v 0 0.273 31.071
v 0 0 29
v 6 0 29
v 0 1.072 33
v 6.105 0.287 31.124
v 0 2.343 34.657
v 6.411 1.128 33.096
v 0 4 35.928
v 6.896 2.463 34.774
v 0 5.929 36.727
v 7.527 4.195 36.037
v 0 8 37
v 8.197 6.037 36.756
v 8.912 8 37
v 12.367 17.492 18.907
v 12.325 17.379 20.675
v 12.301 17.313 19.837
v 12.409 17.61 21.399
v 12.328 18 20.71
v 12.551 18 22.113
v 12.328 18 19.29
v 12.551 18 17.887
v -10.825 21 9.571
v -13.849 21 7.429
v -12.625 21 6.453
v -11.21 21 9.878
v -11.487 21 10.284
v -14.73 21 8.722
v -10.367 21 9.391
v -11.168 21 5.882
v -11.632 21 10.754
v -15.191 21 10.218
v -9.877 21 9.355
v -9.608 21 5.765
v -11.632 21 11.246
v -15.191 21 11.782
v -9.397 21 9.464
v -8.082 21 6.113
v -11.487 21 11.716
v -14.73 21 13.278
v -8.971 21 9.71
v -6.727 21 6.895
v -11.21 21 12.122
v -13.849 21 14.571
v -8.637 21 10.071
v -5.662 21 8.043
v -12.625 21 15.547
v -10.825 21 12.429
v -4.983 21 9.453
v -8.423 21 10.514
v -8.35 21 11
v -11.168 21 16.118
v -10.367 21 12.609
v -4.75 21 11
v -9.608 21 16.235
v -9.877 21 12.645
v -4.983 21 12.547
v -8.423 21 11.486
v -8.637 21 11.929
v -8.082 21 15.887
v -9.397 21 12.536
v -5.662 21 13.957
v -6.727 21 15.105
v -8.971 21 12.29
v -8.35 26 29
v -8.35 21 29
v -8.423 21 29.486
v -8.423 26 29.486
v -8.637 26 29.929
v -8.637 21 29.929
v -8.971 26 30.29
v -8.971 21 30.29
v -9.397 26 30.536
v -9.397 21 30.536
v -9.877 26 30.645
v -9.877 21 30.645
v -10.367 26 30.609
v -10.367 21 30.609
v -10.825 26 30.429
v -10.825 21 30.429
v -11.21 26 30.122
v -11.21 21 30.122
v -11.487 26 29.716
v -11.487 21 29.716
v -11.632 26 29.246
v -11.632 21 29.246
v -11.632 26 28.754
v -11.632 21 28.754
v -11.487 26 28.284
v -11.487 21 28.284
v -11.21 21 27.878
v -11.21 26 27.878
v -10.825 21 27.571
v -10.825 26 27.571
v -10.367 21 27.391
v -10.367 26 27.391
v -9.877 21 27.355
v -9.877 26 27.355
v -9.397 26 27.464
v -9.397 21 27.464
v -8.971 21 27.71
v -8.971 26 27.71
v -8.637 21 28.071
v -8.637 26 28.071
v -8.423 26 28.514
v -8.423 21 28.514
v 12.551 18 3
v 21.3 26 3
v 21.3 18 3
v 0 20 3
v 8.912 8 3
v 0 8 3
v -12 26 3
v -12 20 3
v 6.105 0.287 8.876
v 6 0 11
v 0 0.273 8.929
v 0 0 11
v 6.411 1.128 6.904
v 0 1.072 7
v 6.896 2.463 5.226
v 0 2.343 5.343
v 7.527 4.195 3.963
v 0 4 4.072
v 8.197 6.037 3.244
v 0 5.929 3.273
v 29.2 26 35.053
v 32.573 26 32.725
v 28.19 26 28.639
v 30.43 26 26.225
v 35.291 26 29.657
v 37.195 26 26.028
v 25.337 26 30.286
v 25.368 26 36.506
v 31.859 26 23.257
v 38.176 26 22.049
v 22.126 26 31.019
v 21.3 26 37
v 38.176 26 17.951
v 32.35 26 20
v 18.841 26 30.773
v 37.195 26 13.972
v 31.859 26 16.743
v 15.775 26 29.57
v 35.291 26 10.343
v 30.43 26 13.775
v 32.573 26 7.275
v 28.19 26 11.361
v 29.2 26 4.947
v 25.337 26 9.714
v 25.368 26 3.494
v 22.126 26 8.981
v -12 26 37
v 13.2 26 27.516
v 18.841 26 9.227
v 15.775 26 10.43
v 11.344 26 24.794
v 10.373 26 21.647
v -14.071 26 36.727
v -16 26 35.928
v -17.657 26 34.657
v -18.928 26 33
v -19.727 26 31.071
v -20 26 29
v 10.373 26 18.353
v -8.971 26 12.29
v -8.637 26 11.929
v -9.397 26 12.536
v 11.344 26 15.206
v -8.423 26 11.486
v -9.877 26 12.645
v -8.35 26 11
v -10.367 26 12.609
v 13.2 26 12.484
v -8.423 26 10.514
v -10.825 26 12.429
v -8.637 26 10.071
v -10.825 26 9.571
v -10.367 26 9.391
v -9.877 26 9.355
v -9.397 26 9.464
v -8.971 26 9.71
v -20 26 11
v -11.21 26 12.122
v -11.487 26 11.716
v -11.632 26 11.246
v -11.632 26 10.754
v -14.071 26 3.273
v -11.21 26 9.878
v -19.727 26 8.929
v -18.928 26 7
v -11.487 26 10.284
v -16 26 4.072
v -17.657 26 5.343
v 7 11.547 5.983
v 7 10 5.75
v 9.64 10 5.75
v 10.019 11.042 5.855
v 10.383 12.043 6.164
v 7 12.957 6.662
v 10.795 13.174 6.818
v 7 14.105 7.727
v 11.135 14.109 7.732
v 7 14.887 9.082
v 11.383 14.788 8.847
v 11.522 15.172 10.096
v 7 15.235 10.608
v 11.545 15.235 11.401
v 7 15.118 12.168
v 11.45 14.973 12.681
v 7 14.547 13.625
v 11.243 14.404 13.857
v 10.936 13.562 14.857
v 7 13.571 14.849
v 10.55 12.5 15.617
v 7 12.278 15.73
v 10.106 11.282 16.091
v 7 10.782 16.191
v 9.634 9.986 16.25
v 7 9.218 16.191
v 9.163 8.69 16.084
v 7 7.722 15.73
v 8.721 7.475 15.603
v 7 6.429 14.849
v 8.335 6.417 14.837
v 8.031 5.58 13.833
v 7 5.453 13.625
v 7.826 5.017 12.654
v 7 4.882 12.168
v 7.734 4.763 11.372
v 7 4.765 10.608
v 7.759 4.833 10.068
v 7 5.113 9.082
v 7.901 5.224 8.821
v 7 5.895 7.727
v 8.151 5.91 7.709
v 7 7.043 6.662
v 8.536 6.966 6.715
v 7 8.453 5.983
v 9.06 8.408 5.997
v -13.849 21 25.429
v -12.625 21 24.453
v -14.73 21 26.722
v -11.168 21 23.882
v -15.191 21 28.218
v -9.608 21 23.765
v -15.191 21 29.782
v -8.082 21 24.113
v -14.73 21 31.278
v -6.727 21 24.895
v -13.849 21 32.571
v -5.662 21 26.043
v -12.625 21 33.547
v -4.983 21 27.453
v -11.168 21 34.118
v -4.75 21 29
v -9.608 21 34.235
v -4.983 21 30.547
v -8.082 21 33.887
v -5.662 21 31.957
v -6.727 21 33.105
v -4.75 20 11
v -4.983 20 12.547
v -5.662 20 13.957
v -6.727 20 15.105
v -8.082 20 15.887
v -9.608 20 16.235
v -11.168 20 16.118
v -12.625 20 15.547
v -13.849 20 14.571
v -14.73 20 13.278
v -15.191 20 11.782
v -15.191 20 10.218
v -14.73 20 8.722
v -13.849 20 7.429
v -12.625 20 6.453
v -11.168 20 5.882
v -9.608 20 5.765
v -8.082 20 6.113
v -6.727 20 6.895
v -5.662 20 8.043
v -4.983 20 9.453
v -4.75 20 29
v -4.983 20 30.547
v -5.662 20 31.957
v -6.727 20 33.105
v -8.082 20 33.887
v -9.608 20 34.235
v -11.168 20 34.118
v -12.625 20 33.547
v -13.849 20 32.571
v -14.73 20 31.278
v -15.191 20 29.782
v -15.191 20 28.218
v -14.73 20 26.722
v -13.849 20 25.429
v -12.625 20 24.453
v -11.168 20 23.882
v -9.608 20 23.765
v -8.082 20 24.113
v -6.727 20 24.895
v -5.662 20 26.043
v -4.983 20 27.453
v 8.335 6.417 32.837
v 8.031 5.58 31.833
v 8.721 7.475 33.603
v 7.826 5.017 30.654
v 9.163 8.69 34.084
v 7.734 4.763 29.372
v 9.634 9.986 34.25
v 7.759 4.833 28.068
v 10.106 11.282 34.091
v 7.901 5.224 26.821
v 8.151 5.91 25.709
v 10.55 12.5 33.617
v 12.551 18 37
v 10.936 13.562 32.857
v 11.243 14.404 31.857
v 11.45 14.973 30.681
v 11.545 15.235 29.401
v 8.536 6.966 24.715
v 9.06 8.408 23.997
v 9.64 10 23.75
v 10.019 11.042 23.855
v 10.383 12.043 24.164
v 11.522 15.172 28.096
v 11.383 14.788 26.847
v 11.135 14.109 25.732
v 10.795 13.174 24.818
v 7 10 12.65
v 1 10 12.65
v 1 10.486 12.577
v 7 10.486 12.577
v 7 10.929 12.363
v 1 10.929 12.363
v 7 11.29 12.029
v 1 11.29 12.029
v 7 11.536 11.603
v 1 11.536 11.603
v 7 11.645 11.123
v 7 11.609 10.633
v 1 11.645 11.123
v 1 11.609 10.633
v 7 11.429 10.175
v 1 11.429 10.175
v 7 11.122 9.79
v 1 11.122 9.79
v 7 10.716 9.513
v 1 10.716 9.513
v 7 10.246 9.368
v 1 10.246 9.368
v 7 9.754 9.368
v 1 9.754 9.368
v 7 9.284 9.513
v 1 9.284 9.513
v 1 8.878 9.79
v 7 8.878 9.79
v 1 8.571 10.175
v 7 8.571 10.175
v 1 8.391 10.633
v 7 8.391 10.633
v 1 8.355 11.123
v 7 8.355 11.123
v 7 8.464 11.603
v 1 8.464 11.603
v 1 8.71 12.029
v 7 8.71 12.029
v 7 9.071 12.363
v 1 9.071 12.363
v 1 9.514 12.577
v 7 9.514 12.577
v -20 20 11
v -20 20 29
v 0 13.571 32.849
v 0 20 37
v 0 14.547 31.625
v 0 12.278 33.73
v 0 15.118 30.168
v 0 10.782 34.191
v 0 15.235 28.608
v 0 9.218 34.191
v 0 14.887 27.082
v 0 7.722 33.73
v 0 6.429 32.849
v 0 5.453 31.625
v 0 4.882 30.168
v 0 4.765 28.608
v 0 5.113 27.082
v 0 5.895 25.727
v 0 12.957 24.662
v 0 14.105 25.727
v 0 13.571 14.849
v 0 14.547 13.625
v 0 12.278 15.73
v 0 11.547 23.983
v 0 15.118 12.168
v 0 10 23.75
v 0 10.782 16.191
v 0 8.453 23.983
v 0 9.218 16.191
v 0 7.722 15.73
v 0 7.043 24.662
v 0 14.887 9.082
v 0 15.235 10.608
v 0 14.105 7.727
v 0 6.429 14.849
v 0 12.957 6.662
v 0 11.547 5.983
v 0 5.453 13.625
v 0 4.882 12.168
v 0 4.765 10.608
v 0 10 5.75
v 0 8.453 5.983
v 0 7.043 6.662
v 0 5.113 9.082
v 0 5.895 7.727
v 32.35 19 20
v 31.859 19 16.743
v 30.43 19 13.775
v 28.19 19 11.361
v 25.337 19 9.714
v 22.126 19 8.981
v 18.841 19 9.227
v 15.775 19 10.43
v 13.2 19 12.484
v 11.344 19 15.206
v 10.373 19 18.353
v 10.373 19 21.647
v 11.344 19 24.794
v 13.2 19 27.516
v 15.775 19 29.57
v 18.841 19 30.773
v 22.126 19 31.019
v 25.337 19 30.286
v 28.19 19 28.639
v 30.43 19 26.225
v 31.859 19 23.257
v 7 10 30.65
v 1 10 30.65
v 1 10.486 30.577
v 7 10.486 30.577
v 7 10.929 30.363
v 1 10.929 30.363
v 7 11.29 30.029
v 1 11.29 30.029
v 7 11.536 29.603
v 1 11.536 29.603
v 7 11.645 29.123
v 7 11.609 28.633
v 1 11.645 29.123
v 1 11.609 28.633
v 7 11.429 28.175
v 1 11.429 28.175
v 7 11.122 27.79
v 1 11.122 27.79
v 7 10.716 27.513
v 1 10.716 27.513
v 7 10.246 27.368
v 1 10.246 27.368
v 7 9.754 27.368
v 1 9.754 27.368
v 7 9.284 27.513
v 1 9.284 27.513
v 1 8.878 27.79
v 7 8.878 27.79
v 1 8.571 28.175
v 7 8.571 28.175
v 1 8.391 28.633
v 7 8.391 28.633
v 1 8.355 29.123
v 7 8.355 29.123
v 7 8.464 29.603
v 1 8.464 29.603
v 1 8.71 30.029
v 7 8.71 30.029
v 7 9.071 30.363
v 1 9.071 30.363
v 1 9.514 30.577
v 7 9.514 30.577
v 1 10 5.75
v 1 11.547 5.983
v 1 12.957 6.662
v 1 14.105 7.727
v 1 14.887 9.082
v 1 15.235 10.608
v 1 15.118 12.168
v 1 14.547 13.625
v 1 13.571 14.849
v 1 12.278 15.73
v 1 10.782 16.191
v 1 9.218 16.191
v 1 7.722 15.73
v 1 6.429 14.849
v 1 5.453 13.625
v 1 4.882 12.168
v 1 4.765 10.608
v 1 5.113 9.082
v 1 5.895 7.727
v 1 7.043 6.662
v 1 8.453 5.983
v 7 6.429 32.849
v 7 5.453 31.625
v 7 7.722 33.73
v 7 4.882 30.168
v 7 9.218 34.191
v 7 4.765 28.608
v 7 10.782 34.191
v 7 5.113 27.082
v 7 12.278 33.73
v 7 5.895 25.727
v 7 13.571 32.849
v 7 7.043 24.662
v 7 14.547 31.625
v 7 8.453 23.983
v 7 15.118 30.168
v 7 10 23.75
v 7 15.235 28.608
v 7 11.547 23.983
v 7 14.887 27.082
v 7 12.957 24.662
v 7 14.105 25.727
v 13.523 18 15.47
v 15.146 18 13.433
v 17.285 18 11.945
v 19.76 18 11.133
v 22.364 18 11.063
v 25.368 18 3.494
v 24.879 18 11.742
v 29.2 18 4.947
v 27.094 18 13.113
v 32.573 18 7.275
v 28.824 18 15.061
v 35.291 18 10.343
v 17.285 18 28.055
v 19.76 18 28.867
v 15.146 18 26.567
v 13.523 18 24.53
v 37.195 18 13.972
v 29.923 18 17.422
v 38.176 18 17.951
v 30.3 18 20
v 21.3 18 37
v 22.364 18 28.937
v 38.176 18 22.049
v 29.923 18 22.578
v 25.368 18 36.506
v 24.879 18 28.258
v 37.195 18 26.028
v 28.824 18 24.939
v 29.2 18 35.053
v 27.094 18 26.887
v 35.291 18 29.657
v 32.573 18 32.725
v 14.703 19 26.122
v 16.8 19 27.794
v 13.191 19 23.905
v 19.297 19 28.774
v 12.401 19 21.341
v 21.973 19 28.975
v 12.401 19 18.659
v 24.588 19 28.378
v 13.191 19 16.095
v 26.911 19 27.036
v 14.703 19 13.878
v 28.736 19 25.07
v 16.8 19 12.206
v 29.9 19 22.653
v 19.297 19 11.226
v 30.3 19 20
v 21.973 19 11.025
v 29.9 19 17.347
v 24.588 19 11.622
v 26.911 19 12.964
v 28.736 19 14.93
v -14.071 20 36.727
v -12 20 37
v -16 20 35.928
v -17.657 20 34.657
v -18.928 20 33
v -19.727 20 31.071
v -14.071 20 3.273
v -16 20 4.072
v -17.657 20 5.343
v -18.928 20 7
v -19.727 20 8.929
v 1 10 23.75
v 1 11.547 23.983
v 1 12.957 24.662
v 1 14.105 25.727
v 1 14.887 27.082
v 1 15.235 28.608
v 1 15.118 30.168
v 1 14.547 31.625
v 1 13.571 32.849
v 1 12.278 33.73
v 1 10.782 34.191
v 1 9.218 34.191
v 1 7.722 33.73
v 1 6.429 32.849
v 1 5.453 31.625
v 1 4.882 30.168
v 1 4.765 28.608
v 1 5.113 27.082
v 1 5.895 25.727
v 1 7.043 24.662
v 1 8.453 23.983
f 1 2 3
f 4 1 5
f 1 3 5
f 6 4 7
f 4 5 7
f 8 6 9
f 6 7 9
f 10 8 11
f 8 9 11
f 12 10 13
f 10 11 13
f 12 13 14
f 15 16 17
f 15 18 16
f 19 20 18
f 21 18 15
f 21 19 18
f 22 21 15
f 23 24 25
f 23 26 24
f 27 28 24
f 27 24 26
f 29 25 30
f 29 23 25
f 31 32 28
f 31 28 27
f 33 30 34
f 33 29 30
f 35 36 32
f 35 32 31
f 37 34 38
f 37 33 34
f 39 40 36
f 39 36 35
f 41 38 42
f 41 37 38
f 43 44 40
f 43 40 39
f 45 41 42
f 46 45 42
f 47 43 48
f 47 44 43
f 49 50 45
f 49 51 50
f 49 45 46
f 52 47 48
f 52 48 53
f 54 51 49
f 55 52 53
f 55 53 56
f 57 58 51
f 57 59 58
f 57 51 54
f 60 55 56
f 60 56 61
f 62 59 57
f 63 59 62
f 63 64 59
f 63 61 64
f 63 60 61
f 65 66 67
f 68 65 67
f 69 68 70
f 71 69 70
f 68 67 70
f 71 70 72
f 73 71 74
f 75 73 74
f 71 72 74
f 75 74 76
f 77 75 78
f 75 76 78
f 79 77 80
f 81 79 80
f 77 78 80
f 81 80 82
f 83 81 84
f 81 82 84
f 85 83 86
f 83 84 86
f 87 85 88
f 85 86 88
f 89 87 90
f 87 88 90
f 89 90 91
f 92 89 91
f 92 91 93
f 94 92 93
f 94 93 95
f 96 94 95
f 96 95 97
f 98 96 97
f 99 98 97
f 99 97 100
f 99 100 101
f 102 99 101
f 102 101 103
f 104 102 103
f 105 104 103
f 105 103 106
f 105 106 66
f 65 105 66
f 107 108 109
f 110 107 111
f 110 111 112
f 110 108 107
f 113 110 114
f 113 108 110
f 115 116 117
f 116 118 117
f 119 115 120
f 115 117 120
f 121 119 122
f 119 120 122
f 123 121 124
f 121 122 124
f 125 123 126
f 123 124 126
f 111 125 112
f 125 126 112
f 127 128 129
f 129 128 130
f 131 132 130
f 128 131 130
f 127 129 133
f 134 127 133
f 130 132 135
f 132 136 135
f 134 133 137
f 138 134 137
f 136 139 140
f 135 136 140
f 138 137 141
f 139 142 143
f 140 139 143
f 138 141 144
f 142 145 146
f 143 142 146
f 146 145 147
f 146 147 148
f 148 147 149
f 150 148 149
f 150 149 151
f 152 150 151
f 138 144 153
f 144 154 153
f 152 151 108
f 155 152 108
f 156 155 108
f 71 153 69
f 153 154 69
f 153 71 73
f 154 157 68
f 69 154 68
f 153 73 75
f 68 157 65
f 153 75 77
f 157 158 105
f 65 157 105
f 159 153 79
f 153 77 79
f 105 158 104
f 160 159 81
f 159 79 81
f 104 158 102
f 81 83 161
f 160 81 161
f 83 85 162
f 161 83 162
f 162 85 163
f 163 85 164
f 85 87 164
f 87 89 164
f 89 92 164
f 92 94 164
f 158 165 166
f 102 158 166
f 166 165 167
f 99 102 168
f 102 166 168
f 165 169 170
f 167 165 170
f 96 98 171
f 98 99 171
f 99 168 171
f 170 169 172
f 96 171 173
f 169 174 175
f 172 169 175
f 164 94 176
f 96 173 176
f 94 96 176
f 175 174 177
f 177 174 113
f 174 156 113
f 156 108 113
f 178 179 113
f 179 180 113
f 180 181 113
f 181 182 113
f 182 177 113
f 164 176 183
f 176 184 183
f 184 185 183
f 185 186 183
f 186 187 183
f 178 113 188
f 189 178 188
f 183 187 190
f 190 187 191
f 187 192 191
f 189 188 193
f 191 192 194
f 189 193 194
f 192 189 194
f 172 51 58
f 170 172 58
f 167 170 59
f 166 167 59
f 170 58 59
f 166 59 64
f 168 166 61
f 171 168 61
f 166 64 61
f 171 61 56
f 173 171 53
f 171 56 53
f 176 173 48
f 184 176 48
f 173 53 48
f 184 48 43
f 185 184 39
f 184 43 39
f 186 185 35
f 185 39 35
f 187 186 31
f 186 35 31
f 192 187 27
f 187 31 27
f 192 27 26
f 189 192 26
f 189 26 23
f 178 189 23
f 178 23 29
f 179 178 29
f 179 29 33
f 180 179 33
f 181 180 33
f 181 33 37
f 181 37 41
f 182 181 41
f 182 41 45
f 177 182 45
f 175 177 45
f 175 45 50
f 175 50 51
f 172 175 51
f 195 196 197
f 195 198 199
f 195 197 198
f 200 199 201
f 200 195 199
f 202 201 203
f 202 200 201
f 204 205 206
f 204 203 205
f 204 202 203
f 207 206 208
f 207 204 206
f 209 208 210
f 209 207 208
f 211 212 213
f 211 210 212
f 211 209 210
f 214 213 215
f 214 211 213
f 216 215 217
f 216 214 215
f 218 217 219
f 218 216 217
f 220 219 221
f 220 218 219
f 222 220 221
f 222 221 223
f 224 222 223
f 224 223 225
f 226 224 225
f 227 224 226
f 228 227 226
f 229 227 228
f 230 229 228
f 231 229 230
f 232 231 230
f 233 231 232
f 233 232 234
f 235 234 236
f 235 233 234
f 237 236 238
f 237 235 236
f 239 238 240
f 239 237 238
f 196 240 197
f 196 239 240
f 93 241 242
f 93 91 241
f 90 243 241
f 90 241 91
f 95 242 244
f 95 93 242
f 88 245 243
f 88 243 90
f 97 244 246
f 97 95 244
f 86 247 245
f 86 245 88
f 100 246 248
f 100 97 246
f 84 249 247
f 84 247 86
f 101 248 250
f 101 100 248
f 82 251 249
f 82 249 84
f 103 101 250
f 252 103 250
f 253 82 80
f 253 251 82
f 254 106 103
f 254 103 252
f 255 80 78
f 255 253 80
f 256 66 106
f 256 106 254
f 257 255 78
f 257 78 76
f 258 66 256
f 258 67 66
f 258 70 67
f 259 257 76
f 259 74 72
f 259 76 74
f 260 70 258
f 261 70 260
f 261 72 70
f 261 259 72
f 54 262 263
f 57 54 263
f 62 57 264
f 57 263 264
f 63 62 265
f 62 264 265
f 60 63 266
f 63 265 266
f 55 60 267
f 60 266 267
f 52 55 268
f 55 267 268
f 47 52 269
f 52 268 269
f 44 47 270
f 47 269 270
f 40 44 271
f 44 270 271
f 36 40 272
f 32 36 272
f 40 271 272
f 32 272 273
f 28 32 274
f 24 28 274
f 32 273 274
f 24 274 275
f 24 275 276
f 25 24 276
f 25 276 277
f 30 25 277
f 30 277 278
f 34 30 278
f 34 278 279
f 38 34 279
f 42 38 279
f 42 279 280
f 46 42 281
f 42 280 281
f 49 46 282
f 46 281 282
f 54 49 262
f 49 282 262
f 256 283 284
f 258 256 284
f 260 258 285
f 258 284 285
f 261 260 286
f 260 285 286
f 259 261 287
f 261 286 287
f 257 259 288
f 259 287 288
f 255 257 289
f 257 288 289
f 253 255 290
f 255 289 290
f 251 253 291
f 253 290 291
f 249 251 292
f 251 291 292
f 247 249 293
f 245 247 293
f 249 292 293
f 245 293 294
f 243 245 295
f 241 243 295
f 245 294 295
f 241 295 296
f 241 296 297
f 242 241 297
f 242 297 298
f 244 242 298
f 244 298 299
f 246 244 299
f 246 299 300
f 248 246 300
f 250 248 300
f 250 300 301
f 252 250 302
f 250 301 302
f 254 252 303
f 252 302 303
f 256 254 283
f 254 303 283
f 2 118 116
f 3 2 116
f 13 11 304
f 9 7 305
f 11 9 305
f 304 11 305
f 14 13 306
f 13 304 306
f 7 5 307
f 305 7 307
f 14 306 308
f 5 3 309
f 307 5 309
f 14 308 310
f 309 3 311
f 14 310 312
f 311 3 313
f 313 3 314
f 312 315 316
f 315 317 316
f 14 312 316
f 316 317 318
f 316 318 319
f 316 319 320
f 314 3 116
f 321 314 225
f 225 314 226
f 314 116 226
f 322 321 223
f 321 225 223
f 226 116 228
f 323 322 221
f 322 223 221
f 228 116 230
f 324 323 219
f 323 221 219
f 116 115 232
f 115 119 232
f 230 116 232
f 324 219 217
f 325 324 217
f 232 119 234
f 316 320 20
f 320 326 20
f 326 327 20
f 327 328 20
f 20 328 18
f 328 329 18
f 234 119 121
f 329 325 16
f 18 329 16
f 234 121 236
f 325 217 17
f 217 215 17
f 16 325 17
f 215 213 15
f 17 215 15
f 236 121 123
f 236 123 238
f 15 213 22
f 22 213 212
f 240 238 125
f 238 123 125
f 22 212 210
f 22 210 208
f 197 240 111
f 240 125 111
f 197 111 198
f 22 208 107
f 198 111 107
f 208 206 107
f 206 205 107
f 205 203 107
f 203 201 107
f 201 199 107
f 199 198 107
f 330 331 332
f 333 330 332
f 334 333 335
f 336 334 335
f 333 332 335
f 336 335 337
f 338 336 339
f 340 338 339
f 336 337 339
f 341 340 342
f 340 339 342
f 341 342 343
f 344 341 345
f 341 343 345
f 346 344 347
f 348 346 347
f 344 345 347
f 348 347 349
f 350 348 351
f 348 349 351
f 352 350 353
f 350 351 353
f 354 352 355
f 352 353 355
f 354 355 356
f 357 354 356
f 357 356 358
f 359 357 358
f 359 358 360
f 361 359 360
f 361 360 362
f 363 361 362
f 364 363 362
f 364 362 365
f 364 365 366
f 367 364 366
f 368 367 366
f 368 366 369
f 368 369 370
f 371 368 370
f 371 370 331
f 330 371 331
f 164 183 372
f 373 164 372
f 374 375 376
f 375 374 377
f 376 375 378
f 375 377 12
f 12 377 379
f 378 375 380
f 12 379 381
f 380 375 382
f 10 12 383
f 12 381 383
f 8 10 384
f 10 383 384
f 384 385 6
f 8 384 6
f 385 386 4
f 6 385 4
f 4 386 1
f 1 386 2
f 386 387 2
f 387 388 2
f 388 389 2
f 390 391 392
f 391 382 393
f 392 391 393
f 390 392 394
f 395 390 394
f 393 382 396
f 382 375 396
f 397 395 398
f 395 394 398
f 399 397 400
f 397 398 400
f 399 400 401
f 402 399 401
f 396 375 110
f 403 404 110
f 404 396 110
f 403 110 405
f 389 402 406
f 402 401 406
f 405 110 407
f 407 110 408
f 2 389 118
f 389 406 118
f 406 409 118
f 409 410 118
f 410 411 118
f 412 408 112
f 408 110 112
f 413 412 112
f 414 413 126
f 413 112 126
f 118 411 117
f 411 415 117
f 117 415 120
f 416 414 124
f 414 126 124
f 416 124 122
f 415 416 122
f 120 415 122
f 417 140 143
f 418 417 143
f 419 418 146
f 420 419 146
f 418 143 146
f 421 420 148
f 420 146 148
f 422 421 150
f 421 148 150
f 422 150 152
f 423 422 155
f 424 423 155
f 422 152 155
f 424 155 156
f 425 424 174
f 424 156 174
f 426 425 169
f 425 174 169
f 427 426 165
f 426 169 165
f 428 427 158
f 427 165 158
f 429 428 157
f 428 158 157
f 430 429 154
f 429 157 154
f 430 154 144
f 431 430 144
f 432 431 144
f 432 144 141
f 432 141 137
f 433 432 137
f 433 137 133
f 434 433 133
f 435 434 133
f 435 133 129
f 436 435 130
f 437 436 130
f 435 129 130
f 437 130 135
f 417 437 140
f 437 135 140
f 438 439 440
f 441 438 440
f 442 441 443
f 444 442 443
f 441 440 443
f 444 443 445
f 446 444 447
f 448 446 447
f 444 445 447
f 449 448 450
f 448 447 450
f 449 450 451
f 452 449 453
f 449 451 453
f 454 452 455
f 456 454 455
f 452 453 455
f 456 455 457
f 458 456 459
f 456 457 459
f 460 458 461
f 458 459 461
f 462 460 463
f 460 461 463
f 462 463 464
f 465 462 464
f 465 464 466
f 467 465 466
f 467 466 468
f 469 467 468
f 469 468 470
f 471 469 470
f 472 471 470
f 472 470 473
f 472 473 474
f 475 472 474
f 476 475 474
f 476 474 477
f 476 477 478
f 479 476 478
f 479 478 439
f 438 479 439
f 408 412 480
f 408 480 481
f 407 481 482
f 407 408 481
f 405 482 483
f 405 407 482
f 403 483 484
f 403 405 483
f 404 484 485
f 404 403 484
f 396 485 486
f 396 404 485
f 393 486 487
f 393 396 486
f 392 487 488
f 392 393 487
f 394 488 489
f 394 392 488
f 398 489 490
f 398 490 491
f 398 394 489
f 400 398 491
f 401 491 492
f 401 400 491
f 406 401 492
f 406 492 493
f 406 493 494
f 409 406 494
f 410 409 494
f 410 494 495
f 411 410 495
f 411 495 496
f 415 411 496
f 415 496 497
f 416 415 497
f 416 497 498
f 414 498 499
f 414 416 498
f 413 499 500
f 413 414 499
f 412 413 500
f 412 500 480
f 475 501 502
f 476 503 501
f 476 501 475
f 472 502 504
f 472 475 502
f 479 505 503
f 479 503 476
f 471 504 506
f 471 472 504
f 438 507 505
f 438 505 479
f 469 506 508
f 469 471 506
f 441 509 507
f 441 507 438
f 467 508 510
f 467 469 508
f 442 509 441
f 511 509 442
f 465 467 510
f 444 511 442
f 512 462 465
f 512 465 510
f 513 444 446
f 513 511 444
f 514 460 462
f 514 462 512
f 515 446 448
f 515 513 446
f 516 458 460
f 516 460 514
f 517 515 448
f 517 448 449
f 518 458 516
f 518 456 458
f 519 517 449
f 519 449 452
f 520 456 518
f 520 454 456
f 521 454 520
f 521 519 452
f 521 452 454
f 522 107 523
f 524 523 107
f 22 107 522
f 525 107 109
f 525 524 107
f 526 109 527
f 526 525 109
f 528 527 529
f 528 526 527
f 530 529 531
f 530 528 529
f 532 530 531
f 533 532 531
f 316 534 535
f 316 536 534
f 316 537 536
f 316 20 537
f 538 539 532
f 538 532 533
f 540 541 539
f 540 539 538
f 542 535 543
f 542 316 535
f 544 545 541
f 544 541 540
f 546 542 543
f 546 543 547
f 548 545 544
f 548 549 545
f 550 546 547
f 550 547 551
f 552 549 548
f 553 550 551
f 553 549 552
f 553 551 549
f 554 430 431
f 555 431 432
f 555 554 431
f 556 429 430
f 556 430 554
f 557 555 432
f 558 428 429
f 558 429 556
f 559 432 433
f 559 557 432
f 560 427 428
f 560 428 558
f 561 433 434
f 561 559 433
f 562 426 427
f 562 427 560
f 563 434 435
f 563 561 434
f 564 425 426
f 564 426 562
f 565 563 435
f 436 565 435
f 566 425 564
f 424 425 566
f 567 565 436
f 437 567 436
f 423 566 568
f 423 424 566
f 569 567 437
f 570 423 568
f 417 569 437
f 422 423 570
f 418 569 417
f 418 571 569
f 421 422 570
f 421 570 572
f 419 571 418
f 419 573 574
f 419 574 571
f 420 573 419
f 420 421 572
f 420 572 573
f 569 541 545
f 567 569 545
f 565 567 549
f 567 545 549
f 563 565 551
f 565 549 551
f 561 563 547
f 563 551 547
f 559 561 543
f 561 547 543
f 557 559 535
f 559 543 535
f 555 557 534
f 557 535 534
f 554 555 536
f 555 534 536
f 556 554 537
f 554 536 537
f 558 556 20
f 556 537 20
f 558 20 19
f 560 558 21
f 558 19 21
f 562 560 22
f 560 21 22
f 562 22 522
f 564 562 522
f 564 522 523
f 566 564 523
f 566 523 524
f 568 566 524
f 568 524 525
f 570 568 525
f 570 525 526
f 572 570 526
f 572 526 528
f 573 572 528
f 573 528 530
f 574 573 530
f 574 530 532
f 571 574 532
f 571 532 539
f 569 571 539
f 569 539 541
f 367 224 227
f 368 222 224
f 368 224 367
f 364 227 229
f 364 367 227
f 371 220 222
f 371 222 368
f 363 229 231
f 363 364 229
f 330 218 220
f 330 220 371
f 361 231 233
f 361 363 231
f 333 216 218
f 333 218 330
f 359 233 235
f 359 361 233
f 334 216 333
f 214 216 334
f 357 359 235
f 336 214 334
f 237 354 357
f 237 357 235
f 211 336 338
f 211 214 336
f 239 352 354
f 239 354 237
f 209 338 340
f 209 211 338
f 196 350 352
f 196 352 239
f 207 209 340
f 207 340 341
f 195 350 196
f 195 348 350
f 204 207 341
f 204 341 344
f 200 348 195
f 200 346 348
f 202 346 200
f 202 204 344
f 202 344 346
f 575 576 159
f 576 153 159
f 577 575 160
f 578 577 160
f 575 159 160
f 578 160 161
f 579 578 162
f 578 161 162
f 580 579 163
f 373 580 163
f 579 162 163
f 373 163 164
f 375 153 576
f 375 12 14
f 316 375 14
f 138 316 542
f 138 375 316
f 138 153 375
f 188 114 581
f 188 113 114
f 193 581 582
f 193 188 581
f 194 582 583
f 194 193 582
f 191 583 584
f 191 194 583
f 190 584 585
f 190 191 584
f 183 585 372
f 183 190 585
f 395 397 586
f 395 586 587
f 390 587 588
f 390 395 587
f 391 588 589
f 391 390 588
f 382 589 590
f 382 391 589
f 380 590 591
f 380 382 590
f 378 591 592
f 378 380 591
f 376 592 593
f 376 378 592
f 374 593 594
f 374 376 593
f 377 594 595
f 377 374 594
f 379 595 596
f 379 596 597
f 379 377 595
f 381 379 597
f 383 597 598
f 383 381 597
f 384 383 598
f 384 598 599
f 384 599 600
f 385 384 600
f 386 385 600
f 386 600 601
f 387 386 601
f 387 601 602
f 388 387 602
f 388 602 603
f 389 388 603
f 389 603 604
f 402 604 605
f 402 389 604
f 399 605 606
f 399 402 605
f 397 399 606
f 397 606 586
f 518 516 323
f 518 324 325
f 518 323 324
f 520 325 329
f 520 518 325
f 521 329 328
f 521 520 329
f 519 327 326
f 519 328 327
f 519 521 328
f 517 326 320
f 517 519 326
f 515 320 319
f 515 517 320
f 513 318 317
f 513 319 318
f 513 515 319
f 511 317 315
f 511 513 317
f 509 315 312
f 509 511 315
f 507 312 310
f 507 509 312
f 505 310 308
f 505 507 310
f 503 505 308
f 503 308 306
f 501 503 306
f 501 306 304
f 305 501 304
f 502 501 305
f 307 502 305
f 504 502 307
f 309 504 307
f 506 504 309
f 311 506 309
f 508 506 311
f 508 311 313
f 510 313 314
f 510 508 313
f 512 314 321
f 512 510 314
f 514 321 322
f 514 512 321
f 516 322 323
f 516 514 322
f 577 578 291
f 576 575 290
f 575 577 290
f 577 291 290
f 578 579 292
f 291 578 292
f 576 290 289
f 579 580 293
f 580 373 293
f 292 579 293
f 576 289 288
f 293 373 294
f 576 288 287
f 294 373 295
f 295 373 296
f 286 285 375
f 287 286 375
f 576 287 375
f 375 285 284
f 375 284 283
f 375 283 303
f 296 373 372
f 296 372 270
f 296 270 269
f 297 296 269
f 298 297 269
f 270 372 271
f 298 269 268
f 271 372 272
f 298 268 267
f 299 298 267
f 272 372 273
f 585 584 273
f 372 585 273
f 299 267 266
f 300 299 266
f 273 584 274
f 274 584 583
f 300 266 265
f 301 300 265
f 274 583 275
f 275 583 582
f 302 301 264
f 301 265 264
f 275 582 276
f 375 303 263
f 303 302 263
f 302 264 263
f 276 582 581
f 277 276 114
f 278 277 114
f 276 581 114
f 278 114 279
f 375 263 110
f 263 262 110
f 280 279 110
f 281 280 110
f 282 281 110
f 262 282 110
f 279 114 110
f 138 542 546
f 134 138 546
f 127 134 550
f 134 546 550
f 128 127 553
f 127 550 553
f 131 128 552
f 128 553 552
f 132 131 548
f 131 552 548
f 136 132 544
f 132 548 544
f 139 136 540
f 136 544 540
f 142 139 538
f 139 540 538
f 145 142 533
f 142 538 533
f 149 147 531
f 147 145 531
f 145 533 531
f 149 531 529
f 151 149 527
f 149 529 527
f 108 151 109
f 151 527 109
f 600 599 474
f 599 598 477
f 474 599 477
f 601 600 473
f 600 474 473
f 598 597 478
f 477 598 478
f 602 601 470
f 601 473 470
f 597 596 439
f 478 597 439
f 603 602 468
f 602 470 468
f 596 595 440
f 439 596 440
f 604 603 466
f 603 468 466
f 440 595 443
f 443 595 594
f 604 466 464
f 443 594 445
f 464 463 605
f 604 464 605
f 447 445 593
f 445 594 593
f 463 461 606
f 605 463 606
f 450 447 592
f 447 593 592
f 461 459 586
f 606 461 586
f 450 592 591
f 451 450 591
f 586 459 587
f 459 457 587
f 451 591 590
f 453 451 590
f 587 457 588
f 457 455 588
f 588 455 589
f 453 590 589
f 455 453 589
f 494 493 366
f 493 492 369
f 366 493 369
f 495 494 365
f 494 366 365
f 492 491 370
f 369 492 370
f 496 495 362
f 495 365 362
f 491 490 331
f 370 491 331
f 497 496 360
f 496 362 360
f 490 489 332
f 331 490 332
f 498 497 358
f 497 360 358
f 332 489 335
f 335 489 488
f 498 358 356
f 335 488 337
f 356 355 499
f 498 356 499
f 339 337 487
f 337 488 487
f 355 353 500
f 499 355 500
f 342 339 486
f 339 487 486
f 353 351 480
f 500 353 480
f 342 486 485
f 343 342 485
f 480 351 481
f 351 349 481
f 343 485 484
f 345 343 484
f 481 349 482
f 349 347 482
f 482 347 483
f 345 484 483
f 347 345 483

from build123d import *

# Parameters (mm, degrees)
RESSALTO_EXTRUS_O1_DEPTH   = 40
ESBO_O2_R                  = 1.65
ESBO_O2_R_2                = 9
CORTE_EXTRUS_O1_DEPTH      = 19
CORTE_EXTRUS_O1_DEPTH_BACK = 9
ESBO_O3_R                  = 1.65
CORTE_EXTRUS_O2_DEPTH      = 39.3
ESBO_O4_R                  = 11.05
CORTE_EXTRUS_O3_DEPTH      = 7
CORTE_EXTRUS_O5_START      = 7
ESBO_O7_R                  = 5.25
CORTE_EXTRUS_O5_DEPTH      = 10
FILETE1_R                  = 8
ESBO_O8_R                  = 5.25
CORTE_EXTRUS_O6_DEPTH      = 1
ESBO_O7_2_R                = 5.25
CORTE_EXTRUS_O7_DEPTH      = 1


with BuildPart() as part:
    # Esboço1 → Ressalto-extrusão1 (new body)
    with BuildSketch(Plane.XY):
        Polygon((0, 0), (6, 0), (12.551464217, 18), (49, 18), (49, 26), (-20, 26), (-20, 20), (0, 20), align=None)
    extrude(amount=RESSALTO_EXTRUS_O1_DEPTH)

    # Esboço2 → Corte-extrusão1 (cut, two sides)
    with BuildSketch(Plane.XZ.offset(-18)) as corte_extrus_o1_sk:
        with Locations((-10, 11)):
            Circle(ESBO_O2_R)
        with Locations((21.3, 20)):
            Circle(ESBO_O2_R_2)
        with Locations((-10, 29)):
            Circle(ESBO_O2_R)
        with BuildLine():
            Line((21.3, 3), (-20, 3))
            Line((-20, 3), (-20, 0))
            Line((-20, 0), (49, 0))
            Line((49, 0), (49, 40))
            Line((49, 40), (-20, 40))
            Line((-20, 40), (-20, 37))
            Line((-20, 37), (21.3, 37))
            ThreePointArc((21.3, 37), (38.3, 20), (21.3, 3))
        make_face()
    extrude(amount=CORTE_EXTRUS_O1_DEPTH, mode=Mode.SUBTRACT)
    extrude(corte_extrus_o1_sk.sketch, amount=-CORTE_EXTRUS_O1_DEPTH_BACK, mode=Mode.SUBTRACT)

    # Esboço3 → Corte-extrusão2 (cut, through all)
    with BuildSketch(Plane.ZY):
        with Locations((29, 10)):
            Circle(ESBO_O3_R)
        with Locations((11, 10)):
            Circle(ESBO_O3_R)
    extrude(amount=-CORTE_EXTRUS_O2_DEPTH, mode=Mode.SUBTRACT)

    # Esboço4 → Corte-extrusão3 (cut)
    with BuildSketch(Plane(origin=(0, 26, 0), x_dir=(1, 0, 0), z_dir=(0, 1, 0))):
        with Locations((21.3, -20)):
            Circle(ESBO_O4_R)
    extrude(amount=-CORTE_EXTRUS_O3_DEPTH, mode=Mode.SUBTRACT)

    # Esboço7 → Corte-extrusão5 (cut)
    with BuildSketch(Plane(origin=(0, 0, 0), x_dir=(0, 0, -1), z_dir=(1, 0, 0)).offset(CORTE_EXTRUS_O5_START)):
        with Locations((-29, 10)):
            Circle(ESBO_O7_R)
        with Locations((-11, 10)):
            Circle(ESBO_O7_R)
    extrude(amount=CORTE_EXTRUS_O5_DEPTH, mode=Mode.SUBTRACT)

    # Filete1
    filete1_edges = [part.edges().sort_by_distance(p)[0] for p in [
        (-20, 23, 3),
        (-20, 23, 37),
        (3, 0, 37),
        (3, 0, 3),
    ]]
    fillet(filete1_edges, radius=FILETE1_R)

    # Esboço8 → Corte-extrusão6 (cut)
    with BuildSketch(Plane.XZ.offset(-20)):
        with Locations((-10, 11)):
            Circle(ESBO_O8_R)
        with Locations((-10, 29)):
            Circle(ESBO_O8_R)
    extrude(amount=-CORTE_EXTRUS_O6_DEPTH, mode=Mode.SUBTRACT)

    # Esboço7<2> → Corte-extrusão7 (cut)
    with BuildSketch(Plane(origin=(0, 0, 0), x_dir=(0, 0, -1), z_dir=(1, 0, 0))):
        with Locations((-29, 10)):
            Circle(ESBO_O7_2_R)
        with Locations((-11, 10)):
            Circle(ESBO_O7_2_R)
    extrude(amount=CORTE_EXTRUS_O7_DEPTH, mode=Mode.SUBTRACT)


solid = part.part
